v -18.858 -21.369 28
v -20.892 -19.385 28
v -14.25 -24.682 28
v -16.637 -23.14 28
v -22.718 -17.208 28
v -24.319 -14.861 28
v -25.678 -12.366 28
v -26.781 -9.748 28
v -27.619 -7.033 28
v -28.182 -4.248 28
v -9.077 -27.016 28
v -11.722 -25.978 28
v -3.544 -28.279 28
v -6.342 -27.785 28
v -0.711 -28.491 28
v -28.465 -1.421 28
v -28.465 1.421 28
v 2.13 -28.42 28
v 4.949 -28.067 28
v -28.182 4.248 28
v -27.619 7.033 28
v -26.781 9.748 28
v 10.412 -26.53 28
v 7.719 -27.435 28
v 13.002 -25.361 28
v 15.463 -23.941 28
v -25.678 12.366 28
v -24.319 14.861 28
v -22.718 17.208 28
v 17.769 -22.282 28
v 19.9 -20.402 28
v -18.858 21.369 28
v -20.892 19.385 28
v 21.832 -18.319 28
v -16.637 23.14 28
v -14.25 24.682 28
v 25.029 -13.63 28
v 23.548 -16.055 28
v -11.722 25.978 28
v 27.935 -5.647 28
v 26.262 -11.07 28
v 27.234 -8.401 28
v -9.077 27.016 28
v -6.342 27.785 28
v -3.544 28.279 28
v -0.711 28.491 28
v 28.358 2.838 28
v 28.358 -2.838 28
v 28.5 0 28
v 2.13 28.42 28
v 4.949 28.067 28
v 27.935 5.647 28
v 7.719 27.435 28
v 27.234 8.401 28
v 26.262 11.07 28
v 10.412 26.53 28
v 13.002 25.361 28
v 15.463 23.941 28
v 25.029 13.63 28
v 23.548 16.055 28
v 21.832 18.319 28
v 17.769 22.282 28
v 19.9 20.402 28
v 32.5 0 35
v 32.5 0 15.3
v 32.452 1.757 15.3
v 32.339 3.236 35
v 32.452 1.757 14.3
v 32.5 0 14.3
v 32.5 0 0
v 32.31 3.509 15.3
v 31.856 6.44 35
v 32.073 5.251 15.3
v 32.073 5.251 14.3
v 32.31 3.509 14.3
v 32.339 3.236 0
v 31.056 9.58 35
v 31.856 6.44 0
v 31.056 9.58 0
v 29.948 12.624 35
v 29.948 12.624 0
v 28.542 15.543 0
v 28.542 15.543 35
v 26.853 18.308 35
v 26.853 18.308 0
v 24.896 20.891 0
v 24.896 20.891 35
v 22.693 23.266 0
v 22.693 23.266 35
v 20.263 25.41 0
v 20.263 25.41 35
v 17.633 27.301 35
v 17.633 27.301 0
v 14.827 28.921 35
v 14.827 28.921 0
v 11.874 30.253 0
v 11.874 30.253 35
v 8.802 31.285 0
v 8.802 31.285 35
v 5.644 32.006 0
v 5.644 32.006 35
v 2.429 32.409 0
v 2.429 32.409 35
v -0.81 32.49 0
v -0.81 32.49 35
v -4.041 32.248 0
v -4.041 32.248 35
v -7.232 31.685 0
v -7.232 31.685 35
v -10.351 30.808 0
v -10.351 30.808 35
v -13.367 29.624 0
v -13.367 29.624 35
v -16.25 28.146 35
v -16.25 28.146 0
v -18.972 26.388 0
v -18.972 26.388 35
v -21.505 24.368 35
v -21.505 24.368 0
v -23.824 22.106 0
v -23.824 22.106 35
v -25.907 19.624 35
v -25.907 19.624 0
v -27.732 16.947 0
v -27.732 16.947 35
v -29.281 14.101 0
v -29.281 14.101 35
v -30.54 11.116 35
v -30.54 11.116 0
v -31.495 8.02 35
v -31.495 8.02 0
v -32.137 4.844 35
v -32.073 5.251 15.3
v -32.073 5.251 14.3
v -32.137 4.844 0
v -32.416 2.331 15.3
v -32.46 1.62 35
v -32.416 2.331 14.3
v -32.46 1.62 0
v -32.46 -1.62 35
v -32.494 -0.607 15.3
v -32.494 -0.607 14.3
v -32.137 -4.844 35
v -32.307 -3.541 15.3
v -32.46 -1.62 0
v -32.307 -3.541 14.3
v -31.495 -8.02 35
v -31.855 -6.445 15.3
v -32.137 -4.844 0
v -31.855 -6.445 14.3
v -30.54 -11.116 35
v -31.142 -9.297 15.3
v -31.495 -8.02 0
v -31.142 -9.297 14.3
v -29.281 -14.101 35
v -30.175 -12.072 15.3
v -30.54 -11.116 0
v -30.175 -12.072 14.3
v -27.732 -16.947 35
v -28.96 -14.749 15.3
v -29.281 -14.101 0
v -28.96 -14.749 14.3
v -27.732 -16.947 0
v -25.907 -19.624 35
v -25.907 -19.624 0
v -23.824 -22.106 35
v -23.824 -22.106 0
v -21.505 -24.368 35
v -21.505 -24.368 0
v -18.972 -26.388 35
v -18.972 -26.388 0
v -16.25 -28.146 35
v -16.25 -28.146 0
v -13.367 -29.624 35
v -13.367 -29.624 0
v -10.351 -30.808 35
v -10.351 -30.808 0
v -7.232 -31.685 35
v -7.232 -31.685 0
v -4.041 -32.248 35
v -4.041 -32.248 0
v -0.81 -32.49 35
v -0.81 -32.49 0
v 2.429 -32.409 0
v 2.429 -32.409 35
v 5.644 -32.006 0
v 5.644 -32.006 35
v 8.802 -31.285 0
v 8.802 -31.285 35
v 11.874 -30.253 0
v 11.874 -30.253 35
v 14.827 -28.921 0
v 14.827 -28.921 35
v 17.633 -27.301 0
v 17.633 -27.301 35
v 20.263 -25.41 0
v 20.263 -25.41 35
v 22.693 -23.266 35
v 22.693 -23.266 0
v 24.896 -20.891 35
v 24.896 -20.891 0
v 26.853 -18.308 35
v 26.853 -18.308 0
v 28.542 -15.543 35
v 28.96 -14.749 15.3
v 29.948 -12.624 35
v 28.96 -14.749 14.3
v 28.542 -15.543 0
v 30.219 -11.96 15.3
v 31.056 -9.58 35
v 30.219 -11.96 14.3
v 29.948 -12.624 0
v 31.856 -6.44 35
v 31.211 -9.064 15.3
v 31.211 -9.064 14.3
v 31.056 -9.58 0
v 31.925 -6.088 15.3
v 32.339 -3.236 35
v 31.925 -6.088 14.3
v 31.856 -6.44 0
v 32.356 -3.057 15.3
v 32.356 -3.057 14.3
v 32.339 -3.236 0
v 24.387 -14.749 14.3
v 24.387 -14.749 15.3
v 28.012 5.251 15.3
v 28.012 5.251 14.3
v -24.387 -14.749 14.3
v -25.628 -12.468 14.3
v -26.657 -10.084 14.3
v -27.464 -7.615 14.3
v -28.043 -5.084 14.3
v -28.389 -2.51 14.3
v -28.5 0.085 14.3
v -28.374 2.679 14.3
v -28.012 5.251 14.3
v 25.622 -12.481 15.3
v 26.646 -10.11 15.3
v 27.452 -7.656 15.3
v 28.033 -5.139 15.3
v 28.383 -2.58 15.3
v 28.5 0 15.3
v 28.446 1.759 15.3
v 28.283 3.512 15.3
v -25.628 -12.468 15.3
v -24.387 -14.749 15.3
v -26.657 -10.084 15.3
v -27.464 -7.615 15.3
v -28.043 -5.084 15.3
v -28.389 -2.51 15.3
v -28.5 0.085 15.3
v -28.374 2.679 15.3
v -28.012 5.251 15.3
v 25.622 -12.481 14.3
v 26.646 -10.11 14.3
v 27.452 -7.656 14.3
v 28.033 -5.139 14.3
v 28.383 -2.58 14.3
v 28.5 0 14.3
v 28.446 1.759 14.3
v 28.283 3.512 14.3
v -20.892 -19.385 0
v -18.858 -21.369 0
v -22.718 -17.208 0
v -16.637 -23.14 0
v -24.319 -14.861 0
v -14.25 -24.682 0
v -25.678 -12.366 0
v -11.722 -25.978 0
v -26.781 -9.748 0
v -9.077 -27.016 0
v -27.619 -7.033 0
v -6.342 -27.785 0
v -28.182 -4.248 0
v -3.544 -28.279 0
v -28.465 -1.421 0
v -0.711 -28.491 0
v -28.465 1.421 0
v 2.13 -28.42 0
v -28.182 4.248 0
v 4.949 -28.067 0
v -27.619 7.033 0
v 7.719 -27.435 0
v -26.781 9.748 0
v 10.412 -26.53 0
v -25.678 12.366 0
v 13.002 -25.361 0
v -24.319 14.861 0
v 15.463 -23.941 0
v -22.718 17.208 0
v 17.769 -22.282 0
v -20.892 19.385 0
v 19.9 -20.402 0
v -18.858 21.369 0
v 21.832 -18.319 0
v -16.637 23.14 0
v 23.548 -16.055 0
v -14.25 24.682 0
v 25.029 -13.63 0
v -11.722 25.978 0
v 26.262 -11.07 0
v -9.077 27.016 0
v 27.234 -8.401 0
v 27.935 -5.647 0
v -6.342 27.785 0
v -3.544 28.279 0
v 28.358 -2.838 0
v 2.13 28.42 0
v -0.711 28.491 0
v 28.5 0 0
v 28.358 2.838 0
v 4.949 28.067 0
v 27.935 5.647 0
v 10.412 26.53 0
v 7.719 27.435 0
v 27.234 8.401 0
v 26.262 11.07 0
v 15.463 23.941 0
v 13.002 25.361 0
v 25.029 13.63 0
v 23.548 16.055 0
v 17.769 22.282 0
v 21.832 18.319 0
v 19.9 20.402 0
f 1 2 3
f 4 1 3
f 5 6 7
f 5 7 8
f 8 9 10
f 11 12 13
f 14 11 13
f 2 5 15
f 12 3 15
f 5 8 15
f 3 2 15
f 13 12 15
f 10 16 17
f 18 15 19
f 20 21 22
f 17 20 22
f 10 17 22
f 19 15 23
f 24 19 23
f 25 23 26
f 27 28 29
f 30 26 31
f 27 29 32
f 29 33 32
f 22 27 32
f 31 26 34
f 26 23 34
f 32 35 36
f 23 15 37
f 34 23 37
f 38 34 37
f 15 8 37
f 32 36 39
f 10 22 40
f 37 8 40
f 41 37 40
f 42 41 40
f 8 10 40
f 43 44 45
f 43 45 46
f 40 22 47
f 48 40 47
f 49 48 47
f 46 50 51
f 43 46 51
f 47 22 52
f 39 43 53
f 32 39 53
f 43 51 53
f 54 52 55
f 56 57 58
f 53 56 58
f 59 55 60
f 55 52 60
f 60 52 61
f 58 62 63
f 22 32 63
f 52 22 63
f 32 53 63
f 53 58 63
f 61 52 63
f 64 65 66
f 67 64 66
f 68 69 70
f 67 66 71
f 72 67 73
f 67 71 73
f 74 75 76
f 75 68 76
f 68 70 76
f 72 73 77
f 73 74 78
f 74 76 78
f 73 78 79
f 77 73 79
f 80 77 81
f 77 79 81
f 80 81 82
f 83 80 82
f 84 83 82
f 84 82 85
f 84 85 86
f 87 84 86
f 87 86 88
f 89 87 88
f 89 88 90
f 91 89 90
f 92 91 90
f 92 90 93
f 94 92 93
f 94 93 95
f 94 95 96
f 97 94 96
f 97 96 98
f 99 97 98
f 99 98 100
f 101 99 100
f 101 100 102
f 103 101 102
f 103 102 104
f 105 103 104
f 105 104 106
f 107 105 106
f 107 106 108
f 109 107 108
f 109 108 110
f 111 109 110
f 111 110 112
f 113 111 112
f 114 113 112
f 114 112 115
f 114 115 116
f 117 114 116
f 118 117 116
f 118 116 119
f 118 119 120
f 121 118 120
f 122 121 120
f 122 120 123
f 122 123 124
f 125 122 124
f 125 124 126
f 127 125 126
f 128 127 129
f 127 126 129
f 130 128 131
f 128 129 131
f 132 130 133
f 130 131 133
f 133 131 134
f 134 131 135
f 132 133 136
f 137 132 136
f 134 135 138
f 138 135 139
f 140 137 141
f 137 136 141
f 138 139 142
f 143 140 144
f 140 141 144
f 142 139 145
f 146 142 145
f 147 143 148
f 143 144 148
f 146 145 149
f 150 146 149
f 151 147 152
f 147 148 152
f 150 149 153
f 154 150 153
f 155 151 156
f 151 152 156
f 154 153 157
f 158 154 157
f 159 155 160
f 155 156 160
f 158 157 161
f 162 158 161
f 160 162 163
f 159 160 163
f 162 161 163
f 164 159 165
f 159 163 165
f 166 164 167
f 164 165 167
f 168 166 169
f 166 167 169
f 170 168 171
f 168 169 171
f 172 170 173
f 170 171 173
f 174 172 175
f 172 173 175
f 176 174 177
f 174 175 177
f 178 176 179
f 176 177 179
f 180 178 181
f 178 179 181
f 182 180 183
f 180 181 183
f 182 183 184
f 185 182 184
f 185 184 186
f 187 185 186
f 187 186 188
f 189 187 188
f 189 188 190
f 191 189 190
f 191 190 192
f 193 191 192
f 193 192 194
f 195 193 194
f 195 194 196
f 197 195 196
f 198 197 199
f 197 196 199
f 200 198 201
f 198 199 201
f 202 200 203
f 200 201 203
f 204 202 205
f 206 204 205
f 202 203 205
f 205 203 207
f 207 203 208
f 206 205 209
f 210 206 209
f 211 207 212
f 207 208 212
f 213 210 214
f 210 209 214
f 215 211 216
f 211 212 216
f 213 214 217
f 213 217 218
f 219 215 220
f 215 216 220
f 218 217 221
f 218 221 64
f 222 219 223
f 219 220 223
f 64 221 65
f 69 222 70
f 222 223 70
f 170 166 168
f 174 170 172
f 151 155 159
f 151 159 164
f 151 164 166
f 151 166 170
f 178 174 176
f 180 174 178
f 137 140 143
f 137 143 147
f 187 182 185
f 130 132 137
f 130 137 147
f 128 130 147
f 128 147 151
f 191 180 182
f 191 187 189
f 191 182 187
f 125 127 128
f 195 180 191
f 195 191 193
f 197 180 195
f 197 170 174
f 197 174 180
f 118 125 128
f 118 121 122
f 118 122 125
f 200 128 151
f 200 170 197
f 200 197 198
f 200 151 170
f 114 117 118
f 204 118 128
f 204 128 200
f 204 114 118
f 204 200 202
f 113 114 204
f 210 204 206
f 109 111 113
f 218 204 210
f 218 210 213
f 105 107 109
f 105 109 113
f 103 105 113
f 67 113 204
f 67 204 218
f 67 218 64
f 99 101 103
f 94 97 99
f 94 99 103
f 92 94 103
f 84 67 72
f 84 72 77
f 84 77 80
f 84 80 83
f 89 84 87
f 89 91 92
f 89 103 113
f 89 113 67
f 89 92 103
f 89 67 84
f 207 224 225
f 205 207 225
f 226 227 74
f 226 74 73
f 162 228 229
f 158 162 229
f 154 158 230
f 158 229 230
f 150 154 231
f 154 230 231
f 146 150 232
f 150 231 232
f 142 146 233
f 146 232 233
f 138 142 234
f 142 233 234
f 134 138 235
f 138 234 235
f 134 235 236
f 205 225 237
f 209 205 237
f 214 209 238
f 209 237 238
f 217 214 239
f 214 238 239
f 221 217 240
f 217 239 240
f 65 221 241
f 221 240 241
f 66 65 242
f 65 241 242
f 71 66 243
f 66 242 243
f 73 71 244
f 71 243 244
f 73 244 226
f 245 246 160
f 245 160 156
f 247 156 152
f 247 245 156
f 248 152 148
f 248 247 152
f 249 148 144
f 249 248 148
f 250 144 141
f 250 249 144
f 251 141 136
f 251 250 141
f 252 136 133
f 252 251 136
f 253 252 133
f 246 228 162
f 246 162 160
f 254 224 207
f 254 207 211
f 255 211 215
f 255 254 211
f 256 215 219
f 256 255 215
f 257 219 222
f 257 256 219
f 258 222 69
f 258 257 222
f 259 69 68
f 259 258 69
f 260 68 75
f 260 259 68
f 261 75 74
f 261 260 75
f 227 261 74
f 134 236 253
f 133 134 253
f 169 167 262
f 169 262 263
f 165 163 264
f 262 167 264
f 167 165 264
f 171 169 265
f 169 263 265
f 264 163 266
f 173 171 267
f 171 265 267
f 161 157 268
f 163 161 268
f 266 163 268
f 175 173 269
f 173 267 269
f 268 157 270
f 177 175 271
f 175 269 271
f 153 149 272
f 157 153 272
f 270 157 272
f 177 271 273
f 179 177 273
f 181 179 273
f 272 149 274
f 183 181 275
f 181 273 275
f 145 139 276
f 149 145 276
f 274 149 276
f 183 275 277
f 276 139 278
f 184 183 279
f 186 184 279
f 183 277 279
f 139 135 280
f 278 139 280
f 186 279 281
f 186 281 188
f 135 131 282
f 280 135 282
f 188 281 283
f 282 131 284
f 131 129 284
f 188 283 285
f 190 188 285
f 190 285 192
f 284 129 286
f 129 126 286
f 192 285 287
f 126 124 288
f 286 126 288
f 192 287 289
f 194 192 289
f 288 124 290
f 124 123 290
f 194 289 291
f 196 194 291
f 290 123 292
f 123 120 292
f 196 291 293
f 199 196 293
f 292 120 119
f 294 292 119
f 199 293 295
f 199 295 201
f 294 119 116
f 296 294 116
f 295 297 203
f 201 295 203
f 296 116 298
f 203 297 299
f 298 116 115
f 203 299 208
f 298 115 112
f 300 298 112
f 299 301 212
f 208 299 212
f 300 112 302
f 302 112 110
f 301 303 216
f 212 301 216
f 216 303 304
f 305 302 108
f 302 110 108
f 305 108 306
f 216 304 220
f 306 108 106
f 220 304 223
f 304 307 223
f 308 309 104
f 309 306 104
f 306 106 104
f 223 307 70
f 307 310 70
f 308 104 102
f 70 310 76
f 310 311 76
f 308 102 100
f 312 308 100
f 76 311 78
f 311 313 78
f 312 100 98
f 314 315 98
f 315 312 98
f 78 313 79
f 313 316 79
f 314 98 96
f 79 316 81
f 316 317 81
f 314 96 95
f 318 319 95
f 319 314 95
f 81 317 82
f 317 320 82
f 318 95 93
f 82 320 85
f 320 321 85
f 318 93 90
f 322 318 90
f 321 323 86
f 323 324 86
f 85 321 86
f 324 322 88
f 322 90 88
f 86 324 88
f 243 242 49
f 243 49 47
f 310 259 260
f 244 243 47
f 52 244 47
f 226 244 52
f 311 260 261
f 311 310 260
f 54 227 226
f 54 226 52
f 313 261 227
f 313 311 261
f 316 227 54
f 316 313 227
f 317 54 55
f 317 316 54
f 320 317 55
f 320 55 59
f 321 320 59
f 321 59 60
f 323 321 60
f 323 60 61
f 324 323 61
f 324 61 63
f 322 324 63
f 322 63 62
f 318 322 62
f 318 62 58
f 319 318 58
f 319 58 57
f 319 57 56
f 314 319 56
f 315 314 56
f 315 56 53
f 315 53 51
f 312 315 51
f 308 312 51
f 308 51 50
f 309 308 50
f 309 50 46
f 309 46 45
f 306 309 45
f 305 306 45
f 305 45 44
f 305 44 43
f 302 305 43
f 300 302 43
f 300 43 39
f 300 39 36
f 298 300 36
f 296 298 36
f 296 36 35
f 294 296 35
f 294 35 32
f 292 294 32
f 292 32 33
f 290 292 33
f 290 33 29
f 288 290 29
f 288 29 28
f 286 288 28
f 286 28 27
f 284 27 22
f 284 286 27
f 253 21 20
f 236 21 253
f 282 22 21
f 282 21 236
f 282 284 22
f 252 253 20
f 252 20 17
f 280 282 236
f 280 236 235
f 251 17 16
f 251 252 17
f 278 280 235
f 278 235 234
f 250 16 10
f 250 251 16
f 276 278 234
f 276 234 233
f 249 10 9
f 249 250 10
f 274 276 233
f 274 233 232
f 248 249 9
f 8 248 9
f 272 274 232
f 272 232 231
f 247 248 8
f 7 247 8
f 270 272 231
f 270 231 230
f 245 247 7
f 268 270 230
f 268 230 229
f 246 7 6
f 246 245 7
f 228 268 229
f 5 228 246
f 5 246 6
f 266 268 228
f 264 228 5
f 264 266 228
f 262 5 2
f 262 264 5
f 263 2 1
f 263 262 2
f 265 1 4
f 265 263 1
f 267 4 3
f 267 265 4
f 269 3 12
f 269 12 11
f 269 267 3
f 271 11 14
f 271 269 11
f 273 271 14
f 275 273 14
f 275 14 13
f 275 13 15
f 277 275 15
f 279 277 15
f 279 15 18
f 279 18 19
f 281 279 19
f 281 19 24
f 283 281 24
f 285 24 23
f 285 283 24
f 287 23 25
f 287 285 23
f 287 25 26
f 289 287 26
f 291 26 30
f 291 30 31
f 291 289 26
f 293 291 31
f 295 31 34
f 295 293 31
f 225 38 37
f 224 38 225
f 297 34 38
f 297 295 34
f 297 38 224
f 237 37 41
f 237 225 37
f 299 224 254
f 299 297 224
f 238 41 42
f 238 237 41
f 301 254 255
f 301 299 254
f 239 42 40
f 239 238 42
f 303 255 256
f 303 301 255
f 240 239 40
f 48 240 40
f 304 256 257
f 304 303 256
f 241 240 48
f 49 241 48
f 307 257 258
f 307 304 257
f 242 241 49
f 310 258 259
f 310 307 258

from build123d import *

# Parameters (mm, degrees)
F1_R          = 32.5
F2_DEPTH      = 35
F0_R          = 28.5
F3_DEPTH      = 28
F4_W          = 20
F4_H          = 1
F5_DEPTH      = 40
F5_DEPTH_BACK = 33.5


with BuildPart() as f2:
    # F1 (on Top) → F2 (new body)
    with BuildSketch(Plane.XY):
        Circle(F1_R)
    extrude(amount=F2_DEPTH)

    # F0 (on Top) → F3 (cut)
    with BuildSketch(Plane.XY):
        Circle(F0_R)
    extrude(amount=F3_DEPTH, mode=Mode.SUBTRACT)

    # F4 (on Right) → F5 (cut, two sides)
    with BuildSketch(Plane.YZ) as f5_sk:
        with Locations((-4.7494247556, 14.8)):
            Rectangle(F4_W, F4_H)
    extrude(amount=-F5_DEPTH, mode=Mode.SUBTRACT)
    extrude(f5_sk.sketch, amount=F5_DEPTH_BACK, mode=Mode.SUBTRACT)


solid = f2.part
